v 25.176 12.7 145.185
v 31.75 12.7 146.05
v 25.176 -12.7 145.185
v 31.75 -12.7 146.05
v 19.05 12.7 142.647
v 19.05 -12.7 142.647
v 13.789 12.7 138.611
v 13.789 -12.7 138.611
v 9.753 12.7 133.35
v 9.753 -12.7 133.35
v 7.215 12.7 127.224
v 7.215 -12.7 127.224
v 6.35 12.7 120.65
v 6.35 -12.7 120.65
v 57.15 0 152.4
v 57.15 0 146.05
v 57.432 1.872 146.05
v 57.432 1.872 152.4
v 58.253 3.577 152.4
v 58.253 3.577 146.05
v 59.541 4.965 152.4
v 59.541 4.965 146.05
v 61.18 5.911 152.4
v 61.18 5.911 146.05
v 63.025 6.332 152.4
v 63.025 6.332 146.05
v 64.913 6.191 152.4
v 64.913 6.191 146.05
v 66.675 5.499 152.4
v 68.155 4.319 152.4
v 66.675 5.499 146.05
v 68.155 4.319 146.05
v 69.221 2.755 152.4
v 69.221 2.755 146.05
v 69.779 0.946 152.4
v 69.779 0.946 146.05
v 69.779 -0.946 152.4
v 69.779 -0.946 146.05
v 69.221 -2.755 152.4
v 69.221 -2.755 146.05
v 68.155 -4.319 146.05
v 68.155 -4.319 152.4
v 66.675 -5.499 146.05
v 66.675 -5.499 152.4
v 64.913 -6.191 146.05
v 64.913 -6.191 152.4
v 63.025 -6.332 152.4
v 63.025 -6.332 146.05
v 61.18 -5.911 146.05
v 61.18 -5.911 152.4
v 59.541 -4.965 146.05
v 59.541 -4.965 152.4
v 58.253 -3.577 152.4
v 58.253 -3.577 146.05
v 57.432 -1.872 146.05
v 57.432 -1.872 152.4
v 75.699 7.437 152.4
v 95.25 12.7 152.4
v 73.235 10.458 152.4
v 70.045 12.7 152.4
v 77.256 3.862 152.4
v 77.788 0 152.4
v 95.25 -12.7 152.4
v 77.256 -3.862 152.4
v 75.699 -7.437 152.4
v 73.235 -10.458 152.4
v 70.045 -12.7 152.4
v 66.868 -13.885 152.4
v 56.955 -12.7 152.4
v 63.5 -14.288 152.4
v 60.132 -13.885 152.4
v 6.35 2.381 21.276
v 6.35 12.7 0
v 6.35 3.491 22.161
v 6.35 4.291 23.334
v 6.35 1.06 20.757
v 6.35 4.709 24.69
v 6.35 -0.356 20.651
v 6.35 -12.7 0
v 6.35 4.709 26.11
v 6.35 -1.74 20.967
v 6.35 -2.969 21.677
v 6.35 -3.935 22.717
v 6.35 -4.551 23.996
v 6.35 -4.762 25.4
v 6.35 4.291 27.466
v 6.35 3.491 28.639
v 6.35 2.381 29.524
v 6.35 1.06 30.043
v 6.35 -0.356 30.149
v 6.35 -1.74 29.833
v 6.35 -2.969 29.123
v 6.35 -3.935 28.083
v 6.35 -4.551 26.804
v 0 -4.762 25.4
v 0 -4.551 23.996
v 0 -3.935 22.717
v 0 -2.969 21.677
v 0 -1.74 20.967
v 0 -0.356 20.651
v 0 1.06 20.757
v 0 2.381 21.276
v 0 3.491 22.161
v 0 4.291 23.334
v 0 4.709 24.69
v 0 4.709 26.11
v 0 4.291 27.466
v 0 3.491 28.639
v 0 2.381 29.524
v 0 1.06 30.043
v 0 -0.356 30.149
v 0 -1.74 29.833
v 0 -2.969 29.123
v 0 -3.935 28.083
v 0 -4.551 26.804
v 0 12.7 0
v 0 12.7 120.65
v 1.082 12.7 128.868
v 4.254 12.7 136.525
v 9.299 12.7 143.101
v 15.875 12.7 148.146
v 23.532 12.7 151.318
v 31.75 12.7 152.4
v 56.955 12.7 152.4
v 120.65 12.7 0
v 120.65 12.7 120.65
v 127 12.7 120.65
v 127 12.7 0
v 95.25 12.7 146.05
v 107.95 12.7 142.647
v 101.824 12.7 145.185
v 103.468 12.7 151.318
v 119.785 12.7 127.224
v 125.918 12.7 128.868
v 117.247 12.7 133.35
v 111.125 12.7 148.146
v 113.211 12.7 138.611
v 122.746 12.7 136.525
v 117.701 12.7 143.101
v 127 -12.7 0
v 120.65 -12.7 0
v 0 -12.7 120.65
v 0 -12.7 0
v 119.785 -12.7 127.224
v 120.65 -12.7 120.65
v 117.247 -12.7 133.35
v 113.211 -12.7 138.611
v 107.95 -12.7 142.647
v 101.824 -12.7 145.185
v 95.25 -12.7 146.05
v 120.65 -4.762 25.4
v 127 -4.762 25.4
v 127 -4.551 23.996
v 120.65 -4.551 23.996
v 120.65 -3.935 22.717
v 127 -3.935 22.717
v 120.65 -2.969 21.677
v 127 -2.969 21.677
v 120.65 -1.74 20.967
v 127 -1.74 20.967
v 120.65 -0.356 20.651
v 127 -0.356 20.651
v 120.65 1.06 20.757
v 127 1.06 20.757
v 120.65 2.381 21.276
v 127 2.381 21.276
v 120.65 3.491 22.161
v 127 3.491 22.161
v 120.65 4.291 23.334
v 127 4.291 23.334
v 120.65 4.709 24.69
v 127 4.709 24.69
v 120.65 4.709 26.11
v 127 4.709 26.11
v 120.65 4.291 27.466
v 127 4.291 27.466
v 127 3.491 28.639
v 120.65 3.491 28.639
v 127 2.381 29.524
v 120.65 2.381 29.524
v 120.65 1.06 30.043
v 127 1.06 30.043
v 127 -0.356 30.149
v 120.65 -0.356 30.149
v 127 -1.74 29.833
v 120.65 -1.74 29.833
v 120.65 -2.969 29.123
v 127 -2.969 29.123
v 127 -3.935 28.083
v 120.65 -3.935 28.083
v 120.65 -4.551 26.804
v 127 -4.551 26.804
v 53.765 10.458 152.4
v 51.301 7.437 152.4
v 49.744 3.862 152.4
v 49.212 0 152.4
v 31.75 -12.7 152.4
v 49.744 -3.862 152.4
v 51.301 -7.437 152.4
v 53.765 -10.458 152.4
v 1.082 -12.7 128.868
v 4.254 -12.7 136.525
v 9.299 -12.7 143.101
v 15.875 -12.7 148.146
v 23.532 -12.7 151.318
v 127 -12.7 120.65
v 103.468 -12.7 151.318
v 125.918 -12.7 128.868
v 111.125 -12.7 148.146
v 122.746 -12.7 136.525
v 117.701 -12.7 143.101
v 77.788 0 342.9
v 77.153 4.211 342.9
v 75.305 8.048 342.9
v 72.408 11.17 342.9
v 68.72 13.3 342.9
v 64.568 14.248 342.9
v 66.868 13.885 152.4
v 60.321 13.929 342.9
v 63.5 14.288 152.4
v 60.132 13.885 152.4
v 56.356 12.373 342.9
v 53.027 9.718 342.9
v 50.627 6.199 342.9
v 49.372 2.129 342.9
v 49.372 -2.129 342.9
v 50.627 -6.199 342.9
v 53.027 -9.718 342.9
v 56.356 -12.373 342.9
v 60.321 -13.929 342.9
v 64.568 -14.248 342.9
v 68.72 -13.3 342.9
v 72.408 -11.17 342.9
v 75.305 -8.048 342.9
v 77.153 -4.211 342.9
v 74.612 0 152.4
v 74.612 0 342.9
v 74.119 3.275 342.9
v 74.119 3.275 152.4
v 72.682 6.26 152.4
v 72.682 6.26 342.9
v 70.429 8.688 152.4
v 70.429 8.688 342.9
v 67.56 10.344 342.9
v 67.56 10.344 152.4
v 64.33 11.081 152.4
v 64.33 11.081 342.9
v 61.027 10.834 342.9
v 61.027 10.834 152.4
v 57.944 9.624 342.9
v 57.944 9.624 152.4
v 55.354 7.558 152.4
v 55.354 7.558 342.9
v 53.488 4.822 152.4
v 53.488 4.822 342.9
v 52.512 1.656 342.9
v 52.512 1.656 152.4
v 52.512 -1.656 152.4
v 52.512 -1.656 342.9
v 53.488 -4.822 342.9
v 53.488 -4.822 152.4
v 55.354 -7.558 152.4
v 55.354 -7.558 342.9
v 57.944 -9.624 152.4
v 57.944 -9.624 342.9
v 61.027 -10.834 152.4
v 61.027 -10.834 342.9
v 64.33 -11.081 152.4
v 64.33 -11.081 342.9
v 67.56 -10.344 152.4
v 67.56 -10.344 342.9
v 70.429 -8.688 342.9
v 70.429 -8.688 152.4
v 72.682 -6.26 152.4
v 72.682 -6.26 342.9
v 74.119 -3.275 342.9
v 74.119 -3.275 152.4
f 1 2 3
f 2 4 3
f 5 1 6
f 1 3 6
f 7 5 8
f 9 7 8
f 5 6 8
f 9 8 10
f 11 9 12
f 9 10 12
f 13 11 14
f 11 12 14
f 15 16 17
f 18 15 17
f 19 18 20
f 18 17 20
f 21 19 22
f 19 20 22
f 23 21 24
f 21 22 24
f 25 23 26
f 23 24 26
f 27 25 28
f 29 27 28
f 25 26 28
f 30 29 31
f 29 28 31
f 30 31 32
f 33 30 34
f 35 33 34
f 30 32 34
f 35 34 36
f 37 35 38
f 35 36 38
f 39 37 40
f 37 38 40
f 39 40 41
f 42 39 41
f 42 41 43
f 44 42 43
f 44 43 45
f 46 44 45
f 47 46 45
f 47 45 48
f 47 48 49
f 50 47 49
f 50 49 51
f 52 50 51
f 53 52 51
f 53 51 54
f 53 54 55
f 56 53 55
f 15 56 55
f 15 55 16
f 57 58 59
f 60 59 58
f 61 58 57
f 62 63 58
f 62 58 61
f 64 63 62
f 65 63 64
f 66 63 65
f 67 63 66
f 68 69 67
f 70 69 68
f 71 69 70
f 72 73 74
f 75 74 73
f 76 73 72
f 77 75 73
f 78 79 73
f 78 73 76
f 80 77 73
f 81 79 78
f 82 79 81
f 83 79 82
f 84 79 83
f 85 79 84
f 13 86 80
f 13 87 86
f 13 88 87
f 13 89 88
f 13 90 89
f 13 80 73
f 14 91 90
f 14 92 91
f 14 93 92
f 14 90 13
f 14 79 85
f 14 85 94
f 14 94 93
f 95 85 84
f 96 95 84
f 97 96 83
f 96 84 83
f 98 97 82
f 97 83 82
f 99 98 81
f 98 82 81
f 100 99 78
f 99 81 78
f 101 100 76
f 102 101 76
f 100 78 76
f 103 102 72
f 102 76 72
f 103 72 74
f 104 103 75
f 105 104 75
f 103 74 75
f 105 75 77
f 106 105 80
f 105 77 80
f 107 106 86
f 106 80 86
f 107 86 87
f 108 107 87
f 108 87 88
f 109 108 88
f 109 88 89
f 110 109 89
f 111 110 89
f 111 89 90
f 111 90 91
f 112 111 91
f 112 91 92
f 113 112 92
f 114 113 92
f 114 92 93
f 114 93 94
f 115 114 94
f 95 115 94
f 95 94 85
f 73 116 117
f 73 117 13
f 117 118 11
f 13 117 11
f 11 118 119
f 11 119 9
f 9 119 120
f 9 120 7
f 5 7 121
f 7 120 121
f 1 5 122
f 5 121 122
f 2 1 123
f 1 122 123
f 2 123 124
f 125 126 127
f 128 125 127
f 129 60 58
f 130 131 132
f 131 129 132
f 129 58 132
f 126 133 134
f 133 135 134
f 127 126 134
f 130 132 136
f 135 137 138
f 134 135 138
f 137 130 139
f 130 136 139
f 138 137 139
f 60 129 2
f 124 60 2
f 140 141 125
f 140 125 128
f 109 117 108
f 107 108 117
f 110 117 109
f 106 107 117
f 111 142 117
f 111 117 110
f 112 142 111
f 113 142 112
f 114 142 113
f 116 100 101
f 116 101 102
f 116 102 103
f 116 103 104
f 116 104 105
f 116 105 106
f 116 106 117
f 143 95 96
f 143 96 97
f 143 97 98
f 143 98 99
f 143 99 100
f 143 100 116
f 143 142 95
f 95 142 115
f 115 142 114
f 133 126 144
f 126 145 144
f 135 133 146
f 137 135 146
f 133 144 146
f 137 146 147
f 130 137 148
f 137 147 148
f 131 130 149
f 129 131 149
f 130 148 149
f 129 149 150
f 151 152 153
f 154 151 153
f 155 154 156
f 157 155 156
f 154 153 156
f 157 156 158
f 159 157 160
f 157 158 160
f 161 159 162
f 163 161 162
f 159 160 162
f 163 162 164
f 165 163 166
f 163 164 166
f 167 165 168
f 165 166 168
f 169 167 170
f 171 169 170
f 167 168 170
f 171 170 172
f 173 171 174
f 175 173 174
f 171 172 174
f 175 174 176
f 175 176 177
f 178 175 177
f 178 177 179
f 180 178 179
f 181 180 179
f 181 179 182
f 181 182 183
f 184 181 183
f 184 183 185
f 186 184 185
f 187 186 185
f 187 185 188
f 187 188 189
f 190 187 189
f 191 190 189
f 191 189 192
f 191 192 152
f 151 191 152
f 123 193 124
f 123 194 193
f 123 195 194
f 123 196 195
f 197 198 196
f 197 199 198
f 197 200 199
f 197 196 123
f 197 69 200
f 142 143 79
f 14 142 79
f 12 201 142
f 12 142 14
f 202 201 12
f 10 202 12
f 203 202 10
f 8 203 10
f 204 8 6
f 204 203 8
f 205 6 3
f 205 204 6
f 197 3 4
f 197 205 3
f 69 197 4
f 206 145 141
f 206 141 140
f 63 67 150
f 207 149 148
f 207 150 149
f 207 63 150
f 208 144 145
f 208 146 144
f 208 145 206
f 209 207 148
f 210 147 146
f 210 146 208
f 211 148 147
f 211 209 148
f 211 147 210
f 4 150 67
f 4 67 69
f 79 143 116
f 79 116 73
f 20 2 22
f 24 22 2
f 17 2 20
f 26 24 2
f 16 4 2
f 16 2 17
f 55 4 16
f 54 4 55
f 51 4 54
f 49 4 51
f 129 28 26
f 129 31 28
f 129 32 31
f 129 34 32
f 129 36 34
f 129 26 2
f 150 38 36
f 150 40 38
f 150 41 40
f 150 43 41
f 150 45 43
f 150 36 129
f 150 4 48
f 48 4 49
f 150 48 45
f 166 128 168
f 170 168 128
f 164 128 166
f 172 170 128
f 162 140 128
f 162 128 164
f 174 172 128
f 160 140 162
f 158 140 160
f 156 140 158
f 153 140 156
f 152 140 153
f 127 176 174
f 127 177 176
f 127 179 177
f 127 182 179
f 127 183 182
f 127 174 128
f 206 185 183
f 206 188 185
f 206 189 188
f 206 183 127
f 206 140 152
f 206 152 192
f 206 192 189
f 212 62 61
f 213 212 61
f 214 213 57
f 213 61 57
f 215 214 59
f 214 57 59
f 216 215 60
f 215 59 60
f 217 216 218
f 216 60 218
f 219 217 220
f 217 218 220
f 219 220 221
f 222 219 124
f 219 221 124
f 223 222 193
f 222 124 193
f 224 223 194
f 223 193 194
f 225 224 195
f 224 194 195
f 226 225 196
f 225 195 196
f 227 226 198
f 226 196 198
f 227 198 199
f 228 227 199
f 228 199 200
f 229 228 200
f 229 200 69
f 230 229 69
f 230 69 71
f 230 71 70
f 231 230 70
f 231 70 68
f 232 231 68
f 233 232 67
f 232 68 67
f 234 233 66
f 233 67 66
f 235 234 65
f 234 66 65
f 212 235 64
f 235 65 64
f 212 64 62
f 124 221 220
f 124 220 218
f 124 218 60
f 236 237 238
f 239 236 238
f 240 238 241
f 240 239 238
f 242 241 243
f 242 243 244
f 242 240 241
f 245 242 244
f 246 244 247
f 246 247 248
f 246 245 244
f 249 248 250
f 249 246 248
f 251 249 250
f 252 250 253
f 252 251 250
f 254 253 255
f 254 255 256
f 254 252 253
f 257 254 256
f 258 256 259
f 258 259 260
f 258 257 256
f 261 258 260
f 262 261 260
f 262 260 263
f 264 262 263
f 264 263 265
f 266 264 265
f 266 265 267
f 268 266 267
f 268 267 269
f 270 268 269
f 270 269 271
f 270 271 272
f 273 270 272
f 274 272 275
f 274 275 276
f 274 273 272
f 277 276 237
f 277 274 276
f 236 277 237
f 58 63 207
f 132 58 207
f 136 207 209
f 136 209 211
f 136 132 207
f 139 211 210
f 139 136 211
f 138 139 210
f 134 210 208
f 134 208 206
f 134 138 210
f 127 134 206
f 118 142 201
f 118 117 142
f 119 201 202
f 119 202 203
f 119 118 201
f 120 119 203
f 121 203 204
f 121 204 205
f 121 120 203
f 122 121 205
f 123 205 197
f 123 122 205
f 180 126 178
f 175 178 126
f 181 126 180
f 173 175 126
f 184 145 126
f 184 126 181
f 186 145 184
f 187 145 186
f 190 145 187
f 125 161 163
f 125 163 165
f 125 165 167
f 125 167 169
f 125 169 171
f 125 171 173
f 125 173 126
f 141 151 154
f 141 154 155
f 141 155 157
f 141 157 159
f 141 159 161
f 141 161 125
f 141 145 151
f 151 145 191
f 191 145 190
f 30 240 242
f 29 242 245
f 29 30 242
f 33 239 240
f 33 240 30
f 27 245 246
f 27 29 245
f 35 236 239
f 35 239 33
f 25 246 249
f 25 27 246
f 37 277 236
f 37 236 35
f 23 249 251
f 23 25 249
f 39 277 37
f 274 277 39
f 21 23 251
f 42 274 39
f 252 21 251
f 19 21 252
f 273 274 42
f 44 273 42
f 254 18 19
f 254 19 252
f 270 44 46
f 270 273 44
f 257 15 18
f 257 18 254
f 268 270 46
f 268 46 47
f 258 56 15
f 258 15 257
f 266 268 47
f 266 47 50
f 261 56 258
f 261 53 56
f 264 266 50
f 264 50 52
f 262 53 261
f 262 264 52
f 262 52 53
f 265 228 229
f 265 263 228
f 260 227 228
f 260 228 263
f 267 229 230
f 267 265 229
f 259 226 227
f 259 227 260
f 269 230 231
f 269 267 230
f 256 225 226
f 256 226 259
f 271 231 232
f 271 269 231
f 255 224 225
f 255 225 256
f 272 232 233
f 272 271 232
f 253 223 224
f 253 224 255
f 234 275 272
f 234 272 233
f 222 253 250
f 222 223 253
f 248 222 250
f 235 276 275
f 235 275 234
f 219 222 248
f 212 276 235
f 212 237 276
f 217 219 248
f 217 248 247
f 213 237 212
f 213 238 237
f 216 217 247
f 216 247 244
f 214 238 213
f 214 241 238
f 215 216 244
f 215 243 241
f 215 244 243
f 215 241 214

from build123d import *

# Parameters (mm, degrees)
F1_DEPTH = 12.7
F2_R     = 25.4
F3_R     = 31.75
F5_D     = 9.525
F7_D     = 12.7
F8_R     = 14.2875
F8_R_2   = 11.1125
F9_DEPTH = 190.5


with BuildPart() as f1:
    # F0 (on Front) → F1 (new body, symmetric)
    with BuildSketch(Plane.XZ):
        Polygon((0, 152.4), (0, 0), (6.35, 0), (6.35, 146.05), (120.65, 146.05), (120.65, 0), (127, 0), (127, 152.4), align=None)
    extrude(amount=F1_DEPTH, both=True)

    # F2
    f2_edges = [f1.edges().sort_by_distance(p)[0] for p in [
        (6.35, 0, 146.05),
        (120.65, 0, 146.05),
    ]]
    fillet(f2_edges, radius=F2_R)

    # F3
    f3_edges = [f1.edges().sort_by_distance(p)[0] for p in [
        (127, 0, 152.4),
        (0, 0, 152.4),
    ]]
    fillet(f3_edges, radius=F3_R)

    # F5 (through all)
    with Locations(Plane(origin=(0, 0, 0), x_dir=(0, 1, 0), z_dir=(-1, 0, 0))):
        with Locations((0, -25.4)):
            Hole(F5_D / 2)

    # F7 (through all)
    with Locations(Plane.XY.offset(152.4)):
        with Locations((63.5, 0)):
            Hole(F7_D / 2)

    # F8 (on face) → F9 (join)
    with BuildSketch(Plane.XY.offset(152.4)):
        with Locations((63.5, 0)):
            Circle(F8_R)
        with Locations((63.5, 0)):
            Circle(F8_R_2, mode=Mode.SUBTRACT)
    extrude(amount=F9_DEPTH)


solid = f1.part
